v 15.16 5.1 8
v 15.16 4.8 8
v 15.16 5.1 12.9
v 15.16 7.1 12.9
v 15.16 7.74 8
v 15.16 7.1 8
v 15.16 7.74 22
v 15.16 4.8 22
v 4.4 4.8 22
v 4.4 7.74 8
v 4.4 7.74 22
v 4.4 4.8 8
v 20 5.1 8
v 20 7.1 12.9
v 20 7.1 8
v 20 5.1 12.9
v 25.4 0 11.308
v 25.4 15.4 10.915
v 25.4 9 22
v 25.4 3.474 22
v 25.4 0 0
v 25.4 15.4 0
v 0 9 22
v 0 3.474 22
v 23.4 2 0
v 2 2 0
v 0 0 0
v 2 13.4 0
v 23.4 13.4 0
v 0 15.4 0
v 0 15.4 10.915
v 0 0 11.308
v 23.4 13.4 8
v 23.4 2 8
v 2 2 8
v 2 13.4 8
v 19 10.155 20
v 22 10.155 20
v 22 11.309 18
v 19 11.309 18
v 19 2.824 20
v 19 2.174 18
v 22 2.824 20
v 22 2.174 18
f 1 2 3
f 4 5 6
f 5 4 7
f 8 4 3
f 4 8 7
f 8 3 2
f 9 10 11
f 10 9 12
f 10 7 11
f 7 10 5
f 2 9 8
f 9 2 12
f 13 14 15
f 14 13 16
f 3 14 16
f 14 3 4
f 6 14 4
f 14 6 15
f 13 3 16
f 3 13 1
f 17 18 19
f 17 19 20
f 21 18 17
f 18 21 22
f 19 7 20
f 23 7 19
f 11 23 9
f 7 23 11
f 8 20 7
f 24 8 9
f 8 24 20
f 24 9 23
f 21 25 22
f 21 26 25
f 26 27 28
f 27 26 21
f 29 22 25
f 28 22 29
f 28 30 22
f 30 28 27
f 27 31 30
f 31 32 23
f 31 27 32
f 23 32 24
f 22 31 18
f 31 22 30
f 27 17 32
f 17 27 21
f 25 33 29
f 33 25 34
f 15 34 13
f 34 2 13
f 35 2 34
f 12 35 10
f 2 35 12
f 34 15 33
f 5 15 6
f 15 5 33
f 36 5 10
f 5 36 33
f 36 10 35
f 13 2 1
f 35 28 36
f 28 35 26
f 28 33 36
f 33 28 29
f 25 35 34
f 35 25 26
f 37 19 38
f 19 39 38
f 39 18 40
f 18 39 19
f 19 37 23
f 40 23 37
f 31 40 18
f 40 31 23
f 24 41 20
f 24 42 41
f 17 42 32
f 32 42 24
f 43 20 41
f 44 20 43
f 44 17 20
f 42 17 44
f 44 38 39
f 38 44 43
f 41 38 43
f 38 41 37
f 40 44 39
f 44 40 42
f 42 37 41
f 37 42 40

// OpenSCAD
// Author    KMS - Martin Dubois, P.Eng.
// Copyright (C) 2021 KMS
// Product   EthCAN
// File      Hardware/Tool_ProgCap.scad

difference()
{
    union()
    {
        cube( [ SIZE_X, SIZE_Y, SIZE_Z ] );
    }

    translate( [ TICK, TICK, - EPS ] )
        cube( [ SIZE_X - 2 * TICK, SIZE_Y - 2 * TICK, EPS + INSIDE_Z ] );

    translate( [ TICK, TICK, INSIDE_Z - EPS ] )
    {
        translate( [ 2.4, 2.8, 0 ] )
            cube( [ 4 * 2.54 + 0.6, 2.54 + 0.4, 2 * EPS + SIZE_Z ] );

        translate( [ 12, 3.1, 0 ] )
            cube( [ 6, 2, 5 ] );
    }

    translate( [ - EPS, TICK + 7, SIZE_Z ] )
    {
        rotate( [ - 60, 0, 0 ] )
            cube( [ 2 * EPS + SIZE_X, SIZE_Y, 10 ] );
    }

    translate( [ - EPS, - EPS, 11 ] )
    {
        rotate( [ 72, 0, 0 ] )
            cube( [ 2 * EPS + SIZE_X, 12, 4 ] );
    }

    translate( [ TICK + 17, - EPS, 18 ] )
    {
        cube( [ 3, SIZE_Y, 2 ] );
    }
}

// Private
/////////////////////////////////////////////////////////////////////////////

EPS = 0.1;

INSIDE_Z = 8;

SIZE_X = 25.4;
SIZE_Y = 15.4;
SIZE_Z = 22;

TICK = 2;
